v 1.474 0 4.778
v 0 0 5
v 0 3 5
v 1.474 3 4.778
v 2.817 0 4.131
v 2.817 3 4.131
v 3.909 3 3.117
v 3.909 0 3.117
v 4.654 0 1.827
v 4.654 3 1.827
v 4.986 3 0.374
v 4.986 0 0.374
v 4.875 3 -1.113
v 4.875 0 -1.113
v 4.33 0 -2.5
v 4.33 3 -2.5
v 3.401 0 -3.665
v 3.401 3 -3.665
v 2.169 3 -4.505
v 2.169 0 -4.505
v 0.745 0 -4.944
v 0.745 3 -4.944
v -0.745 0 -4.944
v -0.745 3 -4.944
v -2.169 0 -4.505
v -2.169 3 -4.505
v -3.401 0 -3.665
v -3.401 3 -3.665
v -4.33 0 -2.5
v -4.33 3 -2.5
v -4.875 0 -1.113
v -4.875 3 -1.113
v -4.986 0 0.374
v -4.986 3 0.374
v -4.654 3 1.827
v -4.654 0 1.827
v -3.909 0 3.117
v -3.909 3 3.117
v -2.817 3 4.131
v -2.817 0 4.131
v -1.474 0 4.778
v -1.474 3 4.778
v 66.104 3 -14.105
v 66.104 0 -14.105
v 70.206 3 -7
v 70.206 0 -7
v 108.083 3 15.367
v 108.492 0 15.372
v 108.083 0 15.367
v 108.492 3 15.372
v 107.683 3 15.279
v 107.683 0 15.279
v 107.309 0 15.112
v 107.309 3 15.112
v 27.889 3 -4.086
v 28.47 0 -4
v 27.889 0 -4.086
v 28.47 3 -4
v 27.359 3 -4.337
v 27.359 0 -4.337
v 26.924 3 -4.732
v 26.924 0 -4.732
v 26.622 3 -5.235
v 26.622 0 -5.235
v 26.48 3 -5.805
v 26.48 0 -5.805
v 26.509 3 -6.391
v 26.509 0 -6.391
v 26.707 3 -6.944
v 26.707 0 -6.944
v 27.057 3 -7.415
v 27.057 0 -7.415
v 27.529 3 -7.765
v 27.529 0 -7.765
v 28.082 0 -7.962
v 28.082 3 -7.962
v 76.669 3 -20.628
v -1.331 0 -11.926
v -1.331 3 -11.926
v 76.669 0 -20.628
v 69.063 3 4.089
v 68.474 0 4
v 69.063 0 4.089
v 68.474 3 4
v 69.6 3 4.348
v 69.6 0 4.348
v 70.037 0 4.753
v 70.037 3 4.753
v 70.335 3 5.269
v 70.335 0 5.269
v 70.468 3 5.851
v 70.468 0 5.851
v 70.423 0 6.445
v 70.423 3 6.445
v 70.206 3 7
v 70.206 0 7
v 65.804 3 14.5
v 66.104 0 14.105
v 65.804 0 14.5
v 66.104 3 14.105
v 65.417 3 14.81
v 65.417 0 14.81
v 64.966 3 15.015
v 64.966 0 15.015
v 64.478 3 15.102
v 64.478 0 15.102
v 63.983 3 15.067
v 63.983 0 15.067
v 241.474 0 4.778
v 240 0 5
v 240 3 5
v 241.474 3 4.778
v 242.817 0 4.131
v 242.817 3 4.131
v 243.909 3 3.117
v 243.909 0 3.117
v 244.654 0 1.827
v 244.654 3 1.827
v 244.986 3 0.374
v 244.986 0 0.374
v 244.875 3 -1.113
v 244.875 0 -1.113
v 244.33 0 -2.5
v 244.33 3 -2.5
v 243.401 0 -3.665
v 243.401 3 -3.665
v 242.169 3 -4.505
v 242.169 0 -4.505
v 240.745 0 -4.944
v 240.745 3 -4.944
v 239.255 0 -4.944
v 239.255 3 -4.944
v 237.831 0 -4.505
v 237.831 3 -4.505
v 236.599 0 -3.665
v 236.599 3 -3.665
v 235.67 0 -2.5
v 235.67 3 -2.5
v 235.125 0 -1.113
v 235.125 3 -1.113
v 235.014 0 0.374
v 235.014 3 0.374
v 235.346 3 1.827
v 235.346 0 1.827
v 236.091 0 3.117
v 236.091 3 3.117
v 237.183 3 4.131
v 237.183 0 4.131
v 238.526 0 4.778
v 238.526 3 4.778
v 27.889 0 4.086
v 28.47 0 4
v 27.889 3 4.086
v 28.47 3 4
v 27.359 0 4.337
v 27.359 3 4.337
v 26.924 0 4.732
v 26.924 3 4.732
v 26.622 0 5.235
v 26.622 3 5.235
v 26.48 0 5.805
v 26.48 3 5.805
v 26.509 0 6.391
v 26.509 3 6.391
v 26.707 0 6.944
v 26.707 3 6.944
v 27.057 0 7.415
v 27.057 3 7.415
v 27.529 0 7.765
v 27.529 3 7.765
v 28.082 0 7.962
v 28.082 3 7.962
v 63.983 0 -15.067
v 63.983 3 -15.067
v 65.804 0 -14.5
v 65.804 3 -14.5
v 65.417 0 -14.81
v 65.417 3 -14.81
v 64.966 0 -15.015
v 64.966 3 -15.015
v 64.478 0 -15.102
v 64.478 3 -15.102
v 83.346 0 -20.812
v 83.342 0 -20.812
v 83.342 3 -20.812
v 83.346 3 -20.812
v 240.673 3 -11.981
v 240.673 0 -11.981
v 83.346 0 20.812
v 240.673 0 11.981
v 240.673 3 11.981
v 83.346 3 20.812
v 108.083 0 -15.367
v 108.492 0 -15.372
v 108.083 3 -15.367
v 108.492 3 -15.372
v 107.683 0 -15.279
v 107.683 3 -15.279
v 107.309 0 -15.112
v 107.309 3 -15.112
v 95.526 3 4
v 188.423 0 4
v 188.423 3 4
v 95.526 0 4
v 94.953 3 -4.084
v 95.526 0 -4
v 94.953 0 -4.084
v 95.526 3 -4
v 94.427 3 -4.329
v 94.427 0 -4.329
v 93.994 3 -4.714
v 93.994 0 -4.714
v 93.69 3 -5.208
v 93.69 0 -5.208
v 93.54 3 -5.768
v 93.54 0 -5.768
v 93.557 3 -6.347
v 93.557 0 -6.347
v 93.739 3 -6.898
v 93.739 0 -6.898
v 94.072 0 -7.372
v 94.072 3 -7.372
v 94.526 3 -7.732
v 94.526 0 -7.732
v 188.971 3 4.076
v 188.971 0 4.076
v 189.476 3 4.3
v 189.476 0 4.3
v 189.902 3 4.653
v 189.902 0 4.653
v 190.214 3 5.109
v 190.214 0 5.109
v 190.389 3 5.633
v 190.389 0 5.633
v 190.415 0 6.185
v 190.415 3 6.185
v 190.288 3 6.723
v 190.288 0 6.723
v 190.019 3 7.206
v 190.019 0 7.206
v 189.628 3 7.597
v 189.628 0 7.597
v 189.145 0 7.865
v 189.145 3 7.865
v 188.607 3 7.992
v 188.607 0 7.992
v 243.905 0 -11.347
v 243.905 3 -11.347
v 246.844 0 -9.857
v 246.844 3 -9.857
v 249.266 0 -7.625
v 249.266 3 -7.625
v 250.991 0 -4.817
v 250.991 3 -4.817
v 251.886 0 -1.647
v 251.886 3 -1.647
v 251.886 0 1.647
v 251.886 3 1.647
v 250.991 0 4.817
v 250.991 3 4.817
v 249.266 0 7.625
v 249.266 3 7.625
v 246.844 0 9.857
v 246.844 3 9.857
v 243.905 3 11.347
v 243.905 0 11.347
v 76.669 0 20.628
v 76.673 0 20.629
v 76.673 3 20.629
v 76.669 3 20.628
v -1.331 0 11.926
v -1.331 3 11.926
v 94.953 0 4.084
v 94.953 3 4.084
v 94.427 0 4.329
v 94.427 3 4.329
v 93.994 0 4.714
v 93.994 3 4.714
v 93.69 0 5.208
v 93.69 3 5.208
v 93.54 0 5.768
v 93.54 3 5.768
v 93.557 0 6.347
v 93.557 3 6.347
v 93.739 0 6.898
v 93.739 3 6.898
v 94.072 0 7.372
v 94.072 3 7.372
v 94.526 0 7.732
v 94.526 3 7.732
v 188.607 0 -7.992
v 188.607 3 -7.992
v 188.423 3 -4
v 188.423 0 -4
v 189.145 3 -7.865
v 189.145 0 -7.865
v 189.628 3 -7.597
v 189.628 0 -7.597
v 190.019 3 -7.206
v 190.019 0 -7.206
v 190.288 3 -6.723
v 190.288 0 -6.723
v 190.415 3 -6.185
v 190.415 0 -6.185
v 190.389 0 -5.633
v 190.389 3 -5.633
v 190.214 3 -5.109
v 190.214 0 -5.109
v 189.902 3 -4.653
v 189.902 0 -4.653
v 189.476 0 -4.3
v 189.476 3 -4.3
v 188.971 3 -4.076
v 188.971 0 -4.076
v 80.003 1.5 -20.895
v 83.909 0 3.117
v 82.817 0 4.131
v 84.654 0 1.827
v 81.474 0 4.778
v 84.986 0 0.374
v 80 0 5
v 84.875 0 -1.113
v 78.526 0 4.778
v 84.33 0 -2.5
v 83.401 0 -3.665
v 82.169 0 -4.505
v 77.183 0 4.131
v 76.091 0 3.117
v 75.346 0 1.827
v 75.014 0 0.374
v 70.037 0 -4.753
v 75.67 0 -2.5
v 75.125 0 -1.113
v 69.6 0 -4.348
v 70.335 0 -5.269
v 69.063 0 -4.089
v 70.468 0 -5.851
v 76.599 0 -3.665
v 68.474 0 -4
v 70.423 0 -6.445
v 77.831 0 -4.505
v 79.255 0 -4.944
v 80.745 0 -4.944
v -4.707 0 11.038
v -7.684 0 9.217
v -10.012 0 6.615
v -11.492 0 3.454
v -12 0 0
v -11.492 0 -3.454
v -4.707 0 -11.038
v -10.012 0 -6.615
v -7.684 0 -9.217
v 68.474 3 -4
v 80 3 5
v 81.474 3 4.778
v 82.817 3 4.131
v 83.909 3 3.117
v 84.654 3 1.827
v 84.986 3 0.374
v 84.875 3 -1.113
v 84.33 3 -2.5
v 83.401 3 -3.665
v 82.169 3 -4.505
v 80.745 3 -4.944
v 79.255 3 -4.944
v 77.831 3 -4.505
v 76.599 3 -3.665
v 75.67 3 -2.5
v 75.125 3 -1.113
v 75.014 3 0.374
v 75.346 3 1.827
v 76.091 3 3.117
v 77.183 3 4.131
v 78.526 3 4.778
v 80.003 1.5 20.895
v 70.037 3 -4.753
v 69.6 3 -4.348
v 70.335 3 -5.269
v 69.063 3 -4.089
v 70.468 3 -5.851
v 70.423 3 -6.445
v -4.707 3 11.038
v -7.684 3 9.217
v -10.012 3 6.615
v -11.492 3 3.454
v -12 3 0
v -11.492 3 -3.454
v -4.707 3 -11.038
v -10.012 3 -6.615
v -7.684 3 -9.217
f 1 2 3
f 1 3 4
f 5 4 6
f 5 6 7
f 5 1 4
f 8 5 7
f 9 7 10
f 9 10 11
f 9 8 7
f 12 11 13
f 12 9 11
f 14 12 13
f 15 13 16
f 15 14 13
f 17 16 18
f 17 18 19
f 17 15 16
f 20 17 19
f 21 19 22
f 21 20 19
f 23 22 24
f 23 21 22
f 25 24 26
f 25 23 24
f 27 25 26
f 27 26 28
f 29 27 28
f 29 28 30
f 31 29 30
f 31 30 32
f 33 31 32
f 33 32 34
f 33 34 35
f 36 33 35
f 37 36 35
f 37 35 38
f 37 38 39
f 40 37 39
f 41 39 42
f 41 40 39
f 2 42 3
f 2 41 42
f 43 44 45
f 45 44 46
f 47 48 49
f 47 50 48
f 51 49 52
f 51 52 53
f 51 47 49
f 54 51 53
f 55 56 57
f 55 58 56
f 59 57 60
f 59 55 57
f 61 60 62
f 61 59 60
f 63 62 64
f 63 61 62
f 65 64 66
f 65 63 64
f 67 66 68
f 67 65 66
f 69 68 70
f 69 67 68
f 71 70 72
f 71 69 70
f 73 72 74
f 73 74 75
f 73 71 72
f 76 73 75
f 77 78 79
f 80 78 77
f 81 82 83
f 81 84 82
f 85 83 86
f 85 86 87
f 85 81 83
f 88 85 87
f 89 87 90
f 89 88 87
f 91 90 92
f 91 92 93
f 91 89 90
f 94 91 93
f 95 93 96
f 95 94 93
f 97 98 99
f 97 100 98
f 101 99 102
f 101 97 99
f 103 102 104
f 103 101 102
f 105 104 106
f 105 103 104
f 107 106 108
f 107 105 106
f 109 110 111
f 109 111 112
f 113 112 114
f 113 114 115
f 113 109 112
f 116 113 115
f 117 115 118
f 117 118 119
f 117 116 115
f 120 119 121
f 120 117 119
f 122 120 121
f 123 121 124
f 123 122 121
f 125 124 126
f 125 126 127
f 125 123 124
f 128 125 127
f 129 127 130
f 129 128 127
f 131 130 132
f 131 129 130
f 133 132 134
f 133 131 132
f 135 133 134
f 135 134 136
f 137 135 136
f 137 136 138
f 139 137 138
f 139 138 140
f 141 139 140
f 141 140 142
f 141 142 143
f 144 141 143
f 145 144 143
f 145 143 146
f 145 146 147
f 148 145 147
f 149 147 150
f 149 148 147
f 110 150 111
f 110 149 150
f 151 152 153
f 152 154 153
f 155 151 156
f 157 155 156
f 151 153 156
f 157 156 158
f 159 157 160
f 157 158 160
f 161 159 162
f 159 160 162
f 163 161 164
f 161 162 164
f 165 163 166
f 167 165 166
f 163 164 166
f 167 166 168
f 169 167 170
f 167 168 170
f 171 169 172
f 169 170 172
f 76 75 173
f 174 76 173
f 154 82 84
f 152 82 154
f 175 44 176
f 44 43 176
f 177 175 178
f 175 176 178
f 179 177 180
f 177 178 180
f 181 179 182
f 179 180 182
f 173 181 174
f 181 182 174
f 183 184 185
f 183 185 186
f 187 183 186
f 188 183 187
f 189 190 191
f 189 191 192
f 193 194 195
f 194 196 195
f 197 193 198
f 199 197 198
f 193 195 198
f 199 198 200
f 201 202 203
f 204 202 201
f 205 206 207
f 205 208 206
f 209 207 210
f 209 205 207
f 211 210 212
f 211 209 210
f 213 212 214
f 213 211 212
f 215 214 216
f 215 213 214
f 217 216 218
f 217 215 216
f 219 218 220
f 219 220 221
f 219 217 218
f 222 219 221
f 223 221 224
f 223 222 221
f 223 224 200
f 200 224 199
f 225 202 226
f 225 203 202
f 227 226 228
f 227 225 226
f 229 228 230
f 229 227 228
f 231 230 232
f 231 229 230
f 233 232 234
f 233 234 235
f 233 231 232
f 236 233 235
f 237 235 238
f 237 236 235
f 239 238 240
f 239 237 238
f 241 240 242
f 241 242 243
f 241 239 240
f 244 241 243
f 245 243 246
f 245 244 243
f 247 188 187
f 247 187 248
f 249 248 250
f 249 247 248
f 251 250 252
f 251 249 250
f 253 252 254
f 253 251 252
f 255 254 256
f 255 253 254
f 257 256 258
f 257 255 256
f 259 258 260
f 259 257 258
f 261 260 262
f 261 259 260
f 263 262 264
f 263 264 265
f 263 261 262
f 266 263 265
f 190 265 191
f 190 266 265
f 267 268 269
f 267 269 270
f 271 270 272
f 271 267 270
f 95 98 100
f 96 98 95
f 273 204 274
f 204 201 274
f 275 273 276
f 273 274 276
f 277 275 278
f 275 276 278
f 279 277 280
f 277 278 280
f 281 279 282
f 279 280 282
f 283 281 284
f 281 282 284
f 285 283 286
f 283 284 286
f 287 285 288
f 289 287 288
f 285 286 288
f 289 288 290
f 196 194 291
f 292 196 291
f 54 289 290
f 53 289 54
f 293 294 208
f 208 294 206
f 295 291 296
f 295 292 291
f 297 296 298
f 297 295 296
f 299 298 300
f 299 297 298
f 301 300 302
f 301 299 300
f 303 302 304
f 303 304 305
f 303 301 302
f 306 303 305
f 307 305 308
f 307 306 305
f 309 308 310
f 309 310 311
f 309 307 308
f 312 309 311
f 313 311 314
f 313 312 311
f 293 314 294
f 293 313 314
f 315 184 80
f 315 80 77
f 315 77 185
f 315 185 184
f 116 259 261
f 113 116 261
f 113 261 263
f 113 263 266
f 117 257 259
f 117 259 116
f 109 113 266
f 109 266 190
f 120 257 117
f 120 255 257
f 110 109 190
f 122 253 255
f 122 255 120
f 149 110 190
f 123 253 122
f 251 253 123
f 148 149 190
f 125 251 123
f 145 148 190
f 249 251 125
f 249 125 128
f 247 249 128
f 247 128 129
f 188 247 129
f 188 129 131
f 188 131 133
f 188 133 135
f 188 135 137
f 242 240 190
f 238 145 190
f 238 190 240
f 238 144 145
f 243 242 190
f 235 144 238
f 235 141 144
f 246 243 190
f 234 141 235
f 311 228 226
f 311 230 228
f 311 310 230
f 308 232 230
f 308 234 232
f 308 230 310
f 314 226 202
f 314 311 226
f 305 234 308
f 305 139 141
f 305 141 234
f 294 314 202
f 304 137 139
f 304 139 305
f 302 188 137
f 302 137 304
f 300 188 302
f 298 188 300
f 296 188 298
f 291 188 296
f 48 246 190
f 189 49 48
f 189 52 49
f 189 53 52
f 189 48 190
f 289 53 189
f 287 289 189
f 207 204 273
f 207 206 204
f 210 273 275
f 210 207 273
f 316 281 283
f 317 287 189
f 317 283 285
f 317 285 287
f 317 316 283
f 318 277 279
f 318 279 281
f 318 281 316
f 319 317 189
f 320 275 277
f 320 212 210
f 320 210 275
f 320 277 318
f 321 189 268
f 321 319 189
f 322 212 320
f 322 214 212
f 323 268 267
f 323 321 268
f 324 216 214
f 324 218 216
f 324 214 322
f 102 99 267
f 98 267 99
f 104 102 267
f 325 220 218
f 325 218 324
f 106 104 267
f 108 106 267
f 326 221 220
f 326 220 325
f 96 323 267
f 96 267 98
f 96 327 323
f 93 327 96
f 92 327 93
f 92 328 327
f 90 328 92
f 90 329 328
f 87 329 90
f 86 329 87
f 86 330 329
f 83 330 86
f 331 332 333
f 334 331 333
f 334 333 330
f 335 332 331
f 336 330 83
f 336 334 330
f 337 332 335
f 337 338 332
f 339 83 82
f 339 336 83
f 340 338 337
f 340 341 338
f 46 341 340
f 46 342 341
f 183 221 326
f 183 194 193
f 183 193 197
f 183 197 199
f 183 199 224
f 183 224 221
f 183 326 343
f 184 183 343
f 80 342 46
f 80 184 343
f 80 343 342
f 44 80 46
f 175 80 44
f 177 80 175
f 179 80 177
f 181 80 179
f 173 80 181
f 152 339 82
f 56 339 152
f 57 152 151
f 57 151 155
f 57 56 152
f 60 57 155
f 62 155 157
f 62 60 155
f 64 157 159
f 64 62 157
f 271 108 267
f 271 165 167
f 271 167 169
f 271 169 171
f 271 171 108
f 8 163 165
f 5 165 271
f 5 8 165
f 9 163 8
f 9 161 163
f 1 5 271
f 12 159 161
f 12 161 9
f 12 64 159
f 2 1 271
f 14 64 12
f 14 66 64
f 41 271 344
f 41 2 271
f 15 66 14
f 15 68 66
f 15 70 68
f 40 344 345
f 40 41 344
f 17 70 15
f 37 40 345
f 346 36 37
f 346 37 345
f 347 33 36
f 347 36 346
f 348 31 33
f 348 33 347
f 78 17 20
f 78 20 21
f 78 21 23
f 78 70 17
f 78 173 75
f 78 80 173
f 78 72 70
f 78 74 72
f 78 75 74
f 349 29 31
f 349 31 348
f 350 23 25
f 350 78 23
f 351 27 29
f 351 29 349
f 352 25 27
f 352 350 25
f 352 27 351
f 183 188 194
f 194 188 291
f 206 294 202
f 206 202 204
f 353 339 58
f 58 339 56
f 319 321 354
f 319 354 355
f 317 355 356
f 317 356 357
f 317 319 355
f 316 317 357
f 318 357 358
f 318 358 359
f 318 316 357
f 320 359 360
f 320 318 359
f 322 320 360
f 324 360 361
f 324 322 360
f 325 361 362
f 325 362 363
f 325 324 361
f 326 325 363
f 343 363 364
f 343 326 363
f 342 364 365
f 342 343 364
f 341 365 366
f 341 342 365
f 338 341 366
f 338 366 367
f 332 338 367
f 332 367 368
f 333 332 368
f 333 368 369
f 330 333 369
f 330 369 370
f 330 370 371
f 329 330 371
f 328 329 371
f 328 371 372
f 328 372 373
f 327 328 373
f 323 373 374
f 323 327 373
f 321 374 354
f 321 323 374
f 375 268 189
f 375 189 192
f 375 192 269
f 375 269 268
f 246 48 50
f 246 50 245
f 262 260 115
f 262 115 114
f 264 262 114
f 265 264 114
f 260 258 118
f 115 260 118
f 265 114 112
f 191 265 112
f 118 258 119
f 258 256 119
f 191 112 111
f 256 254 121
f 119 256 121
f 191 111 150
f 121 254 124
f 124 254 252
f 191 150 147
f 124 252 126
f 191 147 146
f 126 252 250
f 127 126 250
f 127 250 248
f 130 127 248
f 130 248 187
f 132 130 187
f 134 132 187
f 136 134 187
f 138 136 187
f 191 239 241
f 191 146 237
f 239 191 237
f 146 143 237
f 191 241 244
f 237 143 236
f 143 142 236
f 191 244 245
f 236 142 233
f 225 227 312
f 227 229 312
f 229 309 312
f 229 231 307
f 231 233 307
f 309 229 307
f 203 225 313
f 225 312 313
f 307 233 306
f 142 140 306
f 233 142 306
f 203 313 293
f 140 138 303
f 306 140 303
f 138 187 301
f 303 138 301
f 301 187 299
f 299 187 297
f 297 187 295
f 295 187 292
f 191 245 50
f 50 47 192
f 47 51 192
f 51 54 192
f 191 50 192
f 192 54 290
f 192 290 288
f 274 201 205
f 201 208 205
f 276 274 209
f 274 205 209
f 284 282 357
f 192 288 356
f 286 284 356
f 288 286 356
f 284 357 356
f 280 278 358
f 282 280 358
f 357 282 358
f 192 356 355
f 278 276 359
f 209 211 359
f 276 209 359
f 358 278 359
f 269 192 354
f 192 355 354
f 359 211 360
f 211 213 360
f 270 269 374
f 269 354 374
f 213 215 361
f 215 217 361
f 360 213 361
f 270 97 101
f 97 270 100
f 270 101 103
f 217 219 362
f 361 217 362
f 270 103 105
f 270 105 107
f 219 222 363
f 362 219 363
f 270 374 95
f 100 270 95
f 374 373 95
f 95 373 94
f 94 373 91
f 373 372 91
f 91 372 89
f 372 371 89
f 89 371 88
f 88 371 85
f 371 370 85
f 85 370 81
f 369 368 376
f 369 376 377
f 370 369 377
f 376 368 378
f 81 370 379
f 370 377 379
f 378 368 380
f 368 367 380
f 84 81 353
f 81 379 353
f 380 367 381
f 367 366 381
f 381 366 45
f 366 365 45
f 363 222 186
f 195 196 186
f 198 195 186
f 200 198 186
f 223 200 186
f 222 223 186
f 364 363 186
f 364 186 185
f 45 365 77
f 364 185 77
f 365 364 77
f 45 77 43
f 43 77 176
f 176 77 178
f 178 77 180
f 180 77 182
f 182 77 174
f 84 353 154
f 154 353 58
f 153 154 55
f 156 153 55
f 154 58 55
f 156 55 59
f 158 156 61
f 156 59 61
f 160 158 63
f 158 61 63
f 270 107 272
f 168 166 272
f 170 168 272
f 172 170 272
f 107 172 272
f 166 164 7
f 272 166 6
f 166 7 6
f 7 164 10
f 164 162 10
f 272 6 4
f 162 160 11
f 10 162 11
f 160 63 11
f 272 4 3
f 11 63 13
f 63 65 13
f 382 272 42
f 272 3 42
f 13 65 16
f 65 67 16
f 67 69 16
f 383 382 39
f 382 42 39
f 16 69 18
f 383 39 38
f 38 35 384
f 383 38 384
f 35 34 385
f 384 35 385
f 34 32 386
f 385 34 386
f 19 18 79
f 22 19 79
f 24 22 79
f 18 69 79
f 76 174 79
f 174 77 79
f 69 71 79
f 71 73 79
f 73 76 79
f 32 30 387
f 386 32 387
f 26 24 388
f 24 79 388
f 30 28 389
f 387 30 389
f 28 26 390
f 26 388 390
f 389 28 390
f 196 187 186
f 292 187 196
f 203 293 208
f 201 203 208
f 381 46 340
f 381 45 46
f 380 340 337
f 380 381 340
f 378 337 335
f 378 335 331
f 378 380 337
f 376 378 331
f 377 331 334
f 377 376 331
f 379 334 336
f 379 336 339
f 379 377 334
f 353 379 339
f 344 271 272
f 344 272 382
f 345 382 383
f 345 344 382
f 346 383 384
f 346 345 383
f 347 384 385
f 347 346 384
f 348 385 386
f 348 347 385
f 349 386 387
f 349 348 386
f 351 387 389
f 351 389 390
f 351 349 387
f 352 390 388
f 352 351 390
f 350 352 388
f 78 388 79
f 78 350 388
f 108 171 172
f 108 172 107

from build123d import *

# Parameters (mm, degrees)
SKETCH_1_R          = 5
EXTRUDE_1_DEPTH     = 3
CUT_EXTRUDE_1_DEPTH = 3
FILLET_2_R          = 2


with BuildPart() as part:
    # 草图1 → 凸台-拉伸1 (new body)
    with BuildSketch(Plane(origin=(0, 0, 0), x_dir=(1, 0, 0), z_dir=(0, 1, 0))):
        with BuildLine():
            Line((-1.330576007, 11.926003836), (80, 21))
            Line((80, 21), (240.672524597, 11.98113979))
            ThreePointArc((240.672524597, 11.98113979), (252, 0), (240.672524597, -11.98113979))
            Line((240.672524597, -11.98113979), (80, -21))
            Line((80, -21), (-1.330576007, -11.926003836))
            ThreePointArc((-1.330576007, -11.926003836), (-12, 0), (-1.330576007, 11.926003836))
        make_face()
        with Locations(Location((0, 0, 0), (0, 0, 270))):
            Circle(SKETCH_1_R, mode=Mode.SUBTRACT)
        with Locations(Location((80, 0, 0), (0, 0, 270))):
            Circle(SKETCH_1_R, mode=Mode.SUBTRACT)
        with Locations(Location((240, 0, 0), (0, 0, 270))):
            Circle(SKETCH_1_R, mode=Mode.SUBTRACT)
    extrude(amount=EXTRUDE_1_DEPTH)

    # 圆角1
    # a fillet whose section is not a circle: 40 mm, written as the material it takes off along each edge
    with BuildSketch(Plane(origin=(80, -8.378669722, 21), x_dir=(0.9984283158275346, 0, -0.0560437164523641), z_dir=(0, 1, 0)), Plane(origin=(80, -8.378669722, -21), x_dir=(-0.9938336529777407, 0, 0.1108813339066567), z_dir=(0, 1, 0))) as fillet_1_piece_1:
        with BuildLine():
            add(Edge.make_bspline([(3.351467889, 0), (2.723727072, 0), (2.095986256, 0), (0.700623386, 0.02340826), (-0.686959659, 0.139669261), (-2.06676288, 0.348783001), (-2.685751394, 0.453242334), (-3.304739908, 0.557701667)], knots=[0, 0, 0, 0, 0, 0, 0.5, 0.5, 1, 1, 1, 1, 1, 1], degree=5))
            Line((-3.304739908, 0.557701667), (0, 0))
            Line((0, 0), (3.351467889, 0))
        make_face()
    extrude(amount=19.757339444, mode=Mode.SUBTRACT)

    # 草图2 → 切除-拉伸1 (cut)
    with BuildSketch(Plane.XZ):
        Polygon((8.062257748, 4), (65.387758913, 15.344903932), (71.937742252, 4), align=None)
        Polygon((88.062257748, 4), (107.859425007, 15.429899846), (231.937742252, 4), align=None)
        Polygon((107.859425007, -15.429899846), (231.937742252, -4), (88.062257748, -4), align=None)
        Polygon((65.387758913, -15.344903932), (71.937742252, -4), (8.062257748, -4), align=None)
    extrude(amount=-CUT_EXTRUDE_1_DEPTH, mode=Mode.SUBTRACT)

    # 圆角2
    fillet_2_edges = [part.edges().sort_by_distance(p)[0] for p in [
        (65.387758913, 1.5, -15.344903932),
        (8.062257748, 1.5, -4),
        (71.937742252, 1.5, -4),
        (107.859425007, 1.5, -15.429899846),
        (88.062257748, 1.5, -4),
        (231.937742252, 1.5, -4),
        (231.937742252, 1.5, 4),
        (88.062257748, 1.5, 4),
        (107.859425007, 1.5, 15.429899846),
        (71.937742252, 1.5, 4),
        (8.062257748, 1.5, 4),
        (65.387758913, 1.5, 15.344903932),
    ]]
    fillet(fillet_2_edges, radius=FILLET_2_R)


solid = part.part
